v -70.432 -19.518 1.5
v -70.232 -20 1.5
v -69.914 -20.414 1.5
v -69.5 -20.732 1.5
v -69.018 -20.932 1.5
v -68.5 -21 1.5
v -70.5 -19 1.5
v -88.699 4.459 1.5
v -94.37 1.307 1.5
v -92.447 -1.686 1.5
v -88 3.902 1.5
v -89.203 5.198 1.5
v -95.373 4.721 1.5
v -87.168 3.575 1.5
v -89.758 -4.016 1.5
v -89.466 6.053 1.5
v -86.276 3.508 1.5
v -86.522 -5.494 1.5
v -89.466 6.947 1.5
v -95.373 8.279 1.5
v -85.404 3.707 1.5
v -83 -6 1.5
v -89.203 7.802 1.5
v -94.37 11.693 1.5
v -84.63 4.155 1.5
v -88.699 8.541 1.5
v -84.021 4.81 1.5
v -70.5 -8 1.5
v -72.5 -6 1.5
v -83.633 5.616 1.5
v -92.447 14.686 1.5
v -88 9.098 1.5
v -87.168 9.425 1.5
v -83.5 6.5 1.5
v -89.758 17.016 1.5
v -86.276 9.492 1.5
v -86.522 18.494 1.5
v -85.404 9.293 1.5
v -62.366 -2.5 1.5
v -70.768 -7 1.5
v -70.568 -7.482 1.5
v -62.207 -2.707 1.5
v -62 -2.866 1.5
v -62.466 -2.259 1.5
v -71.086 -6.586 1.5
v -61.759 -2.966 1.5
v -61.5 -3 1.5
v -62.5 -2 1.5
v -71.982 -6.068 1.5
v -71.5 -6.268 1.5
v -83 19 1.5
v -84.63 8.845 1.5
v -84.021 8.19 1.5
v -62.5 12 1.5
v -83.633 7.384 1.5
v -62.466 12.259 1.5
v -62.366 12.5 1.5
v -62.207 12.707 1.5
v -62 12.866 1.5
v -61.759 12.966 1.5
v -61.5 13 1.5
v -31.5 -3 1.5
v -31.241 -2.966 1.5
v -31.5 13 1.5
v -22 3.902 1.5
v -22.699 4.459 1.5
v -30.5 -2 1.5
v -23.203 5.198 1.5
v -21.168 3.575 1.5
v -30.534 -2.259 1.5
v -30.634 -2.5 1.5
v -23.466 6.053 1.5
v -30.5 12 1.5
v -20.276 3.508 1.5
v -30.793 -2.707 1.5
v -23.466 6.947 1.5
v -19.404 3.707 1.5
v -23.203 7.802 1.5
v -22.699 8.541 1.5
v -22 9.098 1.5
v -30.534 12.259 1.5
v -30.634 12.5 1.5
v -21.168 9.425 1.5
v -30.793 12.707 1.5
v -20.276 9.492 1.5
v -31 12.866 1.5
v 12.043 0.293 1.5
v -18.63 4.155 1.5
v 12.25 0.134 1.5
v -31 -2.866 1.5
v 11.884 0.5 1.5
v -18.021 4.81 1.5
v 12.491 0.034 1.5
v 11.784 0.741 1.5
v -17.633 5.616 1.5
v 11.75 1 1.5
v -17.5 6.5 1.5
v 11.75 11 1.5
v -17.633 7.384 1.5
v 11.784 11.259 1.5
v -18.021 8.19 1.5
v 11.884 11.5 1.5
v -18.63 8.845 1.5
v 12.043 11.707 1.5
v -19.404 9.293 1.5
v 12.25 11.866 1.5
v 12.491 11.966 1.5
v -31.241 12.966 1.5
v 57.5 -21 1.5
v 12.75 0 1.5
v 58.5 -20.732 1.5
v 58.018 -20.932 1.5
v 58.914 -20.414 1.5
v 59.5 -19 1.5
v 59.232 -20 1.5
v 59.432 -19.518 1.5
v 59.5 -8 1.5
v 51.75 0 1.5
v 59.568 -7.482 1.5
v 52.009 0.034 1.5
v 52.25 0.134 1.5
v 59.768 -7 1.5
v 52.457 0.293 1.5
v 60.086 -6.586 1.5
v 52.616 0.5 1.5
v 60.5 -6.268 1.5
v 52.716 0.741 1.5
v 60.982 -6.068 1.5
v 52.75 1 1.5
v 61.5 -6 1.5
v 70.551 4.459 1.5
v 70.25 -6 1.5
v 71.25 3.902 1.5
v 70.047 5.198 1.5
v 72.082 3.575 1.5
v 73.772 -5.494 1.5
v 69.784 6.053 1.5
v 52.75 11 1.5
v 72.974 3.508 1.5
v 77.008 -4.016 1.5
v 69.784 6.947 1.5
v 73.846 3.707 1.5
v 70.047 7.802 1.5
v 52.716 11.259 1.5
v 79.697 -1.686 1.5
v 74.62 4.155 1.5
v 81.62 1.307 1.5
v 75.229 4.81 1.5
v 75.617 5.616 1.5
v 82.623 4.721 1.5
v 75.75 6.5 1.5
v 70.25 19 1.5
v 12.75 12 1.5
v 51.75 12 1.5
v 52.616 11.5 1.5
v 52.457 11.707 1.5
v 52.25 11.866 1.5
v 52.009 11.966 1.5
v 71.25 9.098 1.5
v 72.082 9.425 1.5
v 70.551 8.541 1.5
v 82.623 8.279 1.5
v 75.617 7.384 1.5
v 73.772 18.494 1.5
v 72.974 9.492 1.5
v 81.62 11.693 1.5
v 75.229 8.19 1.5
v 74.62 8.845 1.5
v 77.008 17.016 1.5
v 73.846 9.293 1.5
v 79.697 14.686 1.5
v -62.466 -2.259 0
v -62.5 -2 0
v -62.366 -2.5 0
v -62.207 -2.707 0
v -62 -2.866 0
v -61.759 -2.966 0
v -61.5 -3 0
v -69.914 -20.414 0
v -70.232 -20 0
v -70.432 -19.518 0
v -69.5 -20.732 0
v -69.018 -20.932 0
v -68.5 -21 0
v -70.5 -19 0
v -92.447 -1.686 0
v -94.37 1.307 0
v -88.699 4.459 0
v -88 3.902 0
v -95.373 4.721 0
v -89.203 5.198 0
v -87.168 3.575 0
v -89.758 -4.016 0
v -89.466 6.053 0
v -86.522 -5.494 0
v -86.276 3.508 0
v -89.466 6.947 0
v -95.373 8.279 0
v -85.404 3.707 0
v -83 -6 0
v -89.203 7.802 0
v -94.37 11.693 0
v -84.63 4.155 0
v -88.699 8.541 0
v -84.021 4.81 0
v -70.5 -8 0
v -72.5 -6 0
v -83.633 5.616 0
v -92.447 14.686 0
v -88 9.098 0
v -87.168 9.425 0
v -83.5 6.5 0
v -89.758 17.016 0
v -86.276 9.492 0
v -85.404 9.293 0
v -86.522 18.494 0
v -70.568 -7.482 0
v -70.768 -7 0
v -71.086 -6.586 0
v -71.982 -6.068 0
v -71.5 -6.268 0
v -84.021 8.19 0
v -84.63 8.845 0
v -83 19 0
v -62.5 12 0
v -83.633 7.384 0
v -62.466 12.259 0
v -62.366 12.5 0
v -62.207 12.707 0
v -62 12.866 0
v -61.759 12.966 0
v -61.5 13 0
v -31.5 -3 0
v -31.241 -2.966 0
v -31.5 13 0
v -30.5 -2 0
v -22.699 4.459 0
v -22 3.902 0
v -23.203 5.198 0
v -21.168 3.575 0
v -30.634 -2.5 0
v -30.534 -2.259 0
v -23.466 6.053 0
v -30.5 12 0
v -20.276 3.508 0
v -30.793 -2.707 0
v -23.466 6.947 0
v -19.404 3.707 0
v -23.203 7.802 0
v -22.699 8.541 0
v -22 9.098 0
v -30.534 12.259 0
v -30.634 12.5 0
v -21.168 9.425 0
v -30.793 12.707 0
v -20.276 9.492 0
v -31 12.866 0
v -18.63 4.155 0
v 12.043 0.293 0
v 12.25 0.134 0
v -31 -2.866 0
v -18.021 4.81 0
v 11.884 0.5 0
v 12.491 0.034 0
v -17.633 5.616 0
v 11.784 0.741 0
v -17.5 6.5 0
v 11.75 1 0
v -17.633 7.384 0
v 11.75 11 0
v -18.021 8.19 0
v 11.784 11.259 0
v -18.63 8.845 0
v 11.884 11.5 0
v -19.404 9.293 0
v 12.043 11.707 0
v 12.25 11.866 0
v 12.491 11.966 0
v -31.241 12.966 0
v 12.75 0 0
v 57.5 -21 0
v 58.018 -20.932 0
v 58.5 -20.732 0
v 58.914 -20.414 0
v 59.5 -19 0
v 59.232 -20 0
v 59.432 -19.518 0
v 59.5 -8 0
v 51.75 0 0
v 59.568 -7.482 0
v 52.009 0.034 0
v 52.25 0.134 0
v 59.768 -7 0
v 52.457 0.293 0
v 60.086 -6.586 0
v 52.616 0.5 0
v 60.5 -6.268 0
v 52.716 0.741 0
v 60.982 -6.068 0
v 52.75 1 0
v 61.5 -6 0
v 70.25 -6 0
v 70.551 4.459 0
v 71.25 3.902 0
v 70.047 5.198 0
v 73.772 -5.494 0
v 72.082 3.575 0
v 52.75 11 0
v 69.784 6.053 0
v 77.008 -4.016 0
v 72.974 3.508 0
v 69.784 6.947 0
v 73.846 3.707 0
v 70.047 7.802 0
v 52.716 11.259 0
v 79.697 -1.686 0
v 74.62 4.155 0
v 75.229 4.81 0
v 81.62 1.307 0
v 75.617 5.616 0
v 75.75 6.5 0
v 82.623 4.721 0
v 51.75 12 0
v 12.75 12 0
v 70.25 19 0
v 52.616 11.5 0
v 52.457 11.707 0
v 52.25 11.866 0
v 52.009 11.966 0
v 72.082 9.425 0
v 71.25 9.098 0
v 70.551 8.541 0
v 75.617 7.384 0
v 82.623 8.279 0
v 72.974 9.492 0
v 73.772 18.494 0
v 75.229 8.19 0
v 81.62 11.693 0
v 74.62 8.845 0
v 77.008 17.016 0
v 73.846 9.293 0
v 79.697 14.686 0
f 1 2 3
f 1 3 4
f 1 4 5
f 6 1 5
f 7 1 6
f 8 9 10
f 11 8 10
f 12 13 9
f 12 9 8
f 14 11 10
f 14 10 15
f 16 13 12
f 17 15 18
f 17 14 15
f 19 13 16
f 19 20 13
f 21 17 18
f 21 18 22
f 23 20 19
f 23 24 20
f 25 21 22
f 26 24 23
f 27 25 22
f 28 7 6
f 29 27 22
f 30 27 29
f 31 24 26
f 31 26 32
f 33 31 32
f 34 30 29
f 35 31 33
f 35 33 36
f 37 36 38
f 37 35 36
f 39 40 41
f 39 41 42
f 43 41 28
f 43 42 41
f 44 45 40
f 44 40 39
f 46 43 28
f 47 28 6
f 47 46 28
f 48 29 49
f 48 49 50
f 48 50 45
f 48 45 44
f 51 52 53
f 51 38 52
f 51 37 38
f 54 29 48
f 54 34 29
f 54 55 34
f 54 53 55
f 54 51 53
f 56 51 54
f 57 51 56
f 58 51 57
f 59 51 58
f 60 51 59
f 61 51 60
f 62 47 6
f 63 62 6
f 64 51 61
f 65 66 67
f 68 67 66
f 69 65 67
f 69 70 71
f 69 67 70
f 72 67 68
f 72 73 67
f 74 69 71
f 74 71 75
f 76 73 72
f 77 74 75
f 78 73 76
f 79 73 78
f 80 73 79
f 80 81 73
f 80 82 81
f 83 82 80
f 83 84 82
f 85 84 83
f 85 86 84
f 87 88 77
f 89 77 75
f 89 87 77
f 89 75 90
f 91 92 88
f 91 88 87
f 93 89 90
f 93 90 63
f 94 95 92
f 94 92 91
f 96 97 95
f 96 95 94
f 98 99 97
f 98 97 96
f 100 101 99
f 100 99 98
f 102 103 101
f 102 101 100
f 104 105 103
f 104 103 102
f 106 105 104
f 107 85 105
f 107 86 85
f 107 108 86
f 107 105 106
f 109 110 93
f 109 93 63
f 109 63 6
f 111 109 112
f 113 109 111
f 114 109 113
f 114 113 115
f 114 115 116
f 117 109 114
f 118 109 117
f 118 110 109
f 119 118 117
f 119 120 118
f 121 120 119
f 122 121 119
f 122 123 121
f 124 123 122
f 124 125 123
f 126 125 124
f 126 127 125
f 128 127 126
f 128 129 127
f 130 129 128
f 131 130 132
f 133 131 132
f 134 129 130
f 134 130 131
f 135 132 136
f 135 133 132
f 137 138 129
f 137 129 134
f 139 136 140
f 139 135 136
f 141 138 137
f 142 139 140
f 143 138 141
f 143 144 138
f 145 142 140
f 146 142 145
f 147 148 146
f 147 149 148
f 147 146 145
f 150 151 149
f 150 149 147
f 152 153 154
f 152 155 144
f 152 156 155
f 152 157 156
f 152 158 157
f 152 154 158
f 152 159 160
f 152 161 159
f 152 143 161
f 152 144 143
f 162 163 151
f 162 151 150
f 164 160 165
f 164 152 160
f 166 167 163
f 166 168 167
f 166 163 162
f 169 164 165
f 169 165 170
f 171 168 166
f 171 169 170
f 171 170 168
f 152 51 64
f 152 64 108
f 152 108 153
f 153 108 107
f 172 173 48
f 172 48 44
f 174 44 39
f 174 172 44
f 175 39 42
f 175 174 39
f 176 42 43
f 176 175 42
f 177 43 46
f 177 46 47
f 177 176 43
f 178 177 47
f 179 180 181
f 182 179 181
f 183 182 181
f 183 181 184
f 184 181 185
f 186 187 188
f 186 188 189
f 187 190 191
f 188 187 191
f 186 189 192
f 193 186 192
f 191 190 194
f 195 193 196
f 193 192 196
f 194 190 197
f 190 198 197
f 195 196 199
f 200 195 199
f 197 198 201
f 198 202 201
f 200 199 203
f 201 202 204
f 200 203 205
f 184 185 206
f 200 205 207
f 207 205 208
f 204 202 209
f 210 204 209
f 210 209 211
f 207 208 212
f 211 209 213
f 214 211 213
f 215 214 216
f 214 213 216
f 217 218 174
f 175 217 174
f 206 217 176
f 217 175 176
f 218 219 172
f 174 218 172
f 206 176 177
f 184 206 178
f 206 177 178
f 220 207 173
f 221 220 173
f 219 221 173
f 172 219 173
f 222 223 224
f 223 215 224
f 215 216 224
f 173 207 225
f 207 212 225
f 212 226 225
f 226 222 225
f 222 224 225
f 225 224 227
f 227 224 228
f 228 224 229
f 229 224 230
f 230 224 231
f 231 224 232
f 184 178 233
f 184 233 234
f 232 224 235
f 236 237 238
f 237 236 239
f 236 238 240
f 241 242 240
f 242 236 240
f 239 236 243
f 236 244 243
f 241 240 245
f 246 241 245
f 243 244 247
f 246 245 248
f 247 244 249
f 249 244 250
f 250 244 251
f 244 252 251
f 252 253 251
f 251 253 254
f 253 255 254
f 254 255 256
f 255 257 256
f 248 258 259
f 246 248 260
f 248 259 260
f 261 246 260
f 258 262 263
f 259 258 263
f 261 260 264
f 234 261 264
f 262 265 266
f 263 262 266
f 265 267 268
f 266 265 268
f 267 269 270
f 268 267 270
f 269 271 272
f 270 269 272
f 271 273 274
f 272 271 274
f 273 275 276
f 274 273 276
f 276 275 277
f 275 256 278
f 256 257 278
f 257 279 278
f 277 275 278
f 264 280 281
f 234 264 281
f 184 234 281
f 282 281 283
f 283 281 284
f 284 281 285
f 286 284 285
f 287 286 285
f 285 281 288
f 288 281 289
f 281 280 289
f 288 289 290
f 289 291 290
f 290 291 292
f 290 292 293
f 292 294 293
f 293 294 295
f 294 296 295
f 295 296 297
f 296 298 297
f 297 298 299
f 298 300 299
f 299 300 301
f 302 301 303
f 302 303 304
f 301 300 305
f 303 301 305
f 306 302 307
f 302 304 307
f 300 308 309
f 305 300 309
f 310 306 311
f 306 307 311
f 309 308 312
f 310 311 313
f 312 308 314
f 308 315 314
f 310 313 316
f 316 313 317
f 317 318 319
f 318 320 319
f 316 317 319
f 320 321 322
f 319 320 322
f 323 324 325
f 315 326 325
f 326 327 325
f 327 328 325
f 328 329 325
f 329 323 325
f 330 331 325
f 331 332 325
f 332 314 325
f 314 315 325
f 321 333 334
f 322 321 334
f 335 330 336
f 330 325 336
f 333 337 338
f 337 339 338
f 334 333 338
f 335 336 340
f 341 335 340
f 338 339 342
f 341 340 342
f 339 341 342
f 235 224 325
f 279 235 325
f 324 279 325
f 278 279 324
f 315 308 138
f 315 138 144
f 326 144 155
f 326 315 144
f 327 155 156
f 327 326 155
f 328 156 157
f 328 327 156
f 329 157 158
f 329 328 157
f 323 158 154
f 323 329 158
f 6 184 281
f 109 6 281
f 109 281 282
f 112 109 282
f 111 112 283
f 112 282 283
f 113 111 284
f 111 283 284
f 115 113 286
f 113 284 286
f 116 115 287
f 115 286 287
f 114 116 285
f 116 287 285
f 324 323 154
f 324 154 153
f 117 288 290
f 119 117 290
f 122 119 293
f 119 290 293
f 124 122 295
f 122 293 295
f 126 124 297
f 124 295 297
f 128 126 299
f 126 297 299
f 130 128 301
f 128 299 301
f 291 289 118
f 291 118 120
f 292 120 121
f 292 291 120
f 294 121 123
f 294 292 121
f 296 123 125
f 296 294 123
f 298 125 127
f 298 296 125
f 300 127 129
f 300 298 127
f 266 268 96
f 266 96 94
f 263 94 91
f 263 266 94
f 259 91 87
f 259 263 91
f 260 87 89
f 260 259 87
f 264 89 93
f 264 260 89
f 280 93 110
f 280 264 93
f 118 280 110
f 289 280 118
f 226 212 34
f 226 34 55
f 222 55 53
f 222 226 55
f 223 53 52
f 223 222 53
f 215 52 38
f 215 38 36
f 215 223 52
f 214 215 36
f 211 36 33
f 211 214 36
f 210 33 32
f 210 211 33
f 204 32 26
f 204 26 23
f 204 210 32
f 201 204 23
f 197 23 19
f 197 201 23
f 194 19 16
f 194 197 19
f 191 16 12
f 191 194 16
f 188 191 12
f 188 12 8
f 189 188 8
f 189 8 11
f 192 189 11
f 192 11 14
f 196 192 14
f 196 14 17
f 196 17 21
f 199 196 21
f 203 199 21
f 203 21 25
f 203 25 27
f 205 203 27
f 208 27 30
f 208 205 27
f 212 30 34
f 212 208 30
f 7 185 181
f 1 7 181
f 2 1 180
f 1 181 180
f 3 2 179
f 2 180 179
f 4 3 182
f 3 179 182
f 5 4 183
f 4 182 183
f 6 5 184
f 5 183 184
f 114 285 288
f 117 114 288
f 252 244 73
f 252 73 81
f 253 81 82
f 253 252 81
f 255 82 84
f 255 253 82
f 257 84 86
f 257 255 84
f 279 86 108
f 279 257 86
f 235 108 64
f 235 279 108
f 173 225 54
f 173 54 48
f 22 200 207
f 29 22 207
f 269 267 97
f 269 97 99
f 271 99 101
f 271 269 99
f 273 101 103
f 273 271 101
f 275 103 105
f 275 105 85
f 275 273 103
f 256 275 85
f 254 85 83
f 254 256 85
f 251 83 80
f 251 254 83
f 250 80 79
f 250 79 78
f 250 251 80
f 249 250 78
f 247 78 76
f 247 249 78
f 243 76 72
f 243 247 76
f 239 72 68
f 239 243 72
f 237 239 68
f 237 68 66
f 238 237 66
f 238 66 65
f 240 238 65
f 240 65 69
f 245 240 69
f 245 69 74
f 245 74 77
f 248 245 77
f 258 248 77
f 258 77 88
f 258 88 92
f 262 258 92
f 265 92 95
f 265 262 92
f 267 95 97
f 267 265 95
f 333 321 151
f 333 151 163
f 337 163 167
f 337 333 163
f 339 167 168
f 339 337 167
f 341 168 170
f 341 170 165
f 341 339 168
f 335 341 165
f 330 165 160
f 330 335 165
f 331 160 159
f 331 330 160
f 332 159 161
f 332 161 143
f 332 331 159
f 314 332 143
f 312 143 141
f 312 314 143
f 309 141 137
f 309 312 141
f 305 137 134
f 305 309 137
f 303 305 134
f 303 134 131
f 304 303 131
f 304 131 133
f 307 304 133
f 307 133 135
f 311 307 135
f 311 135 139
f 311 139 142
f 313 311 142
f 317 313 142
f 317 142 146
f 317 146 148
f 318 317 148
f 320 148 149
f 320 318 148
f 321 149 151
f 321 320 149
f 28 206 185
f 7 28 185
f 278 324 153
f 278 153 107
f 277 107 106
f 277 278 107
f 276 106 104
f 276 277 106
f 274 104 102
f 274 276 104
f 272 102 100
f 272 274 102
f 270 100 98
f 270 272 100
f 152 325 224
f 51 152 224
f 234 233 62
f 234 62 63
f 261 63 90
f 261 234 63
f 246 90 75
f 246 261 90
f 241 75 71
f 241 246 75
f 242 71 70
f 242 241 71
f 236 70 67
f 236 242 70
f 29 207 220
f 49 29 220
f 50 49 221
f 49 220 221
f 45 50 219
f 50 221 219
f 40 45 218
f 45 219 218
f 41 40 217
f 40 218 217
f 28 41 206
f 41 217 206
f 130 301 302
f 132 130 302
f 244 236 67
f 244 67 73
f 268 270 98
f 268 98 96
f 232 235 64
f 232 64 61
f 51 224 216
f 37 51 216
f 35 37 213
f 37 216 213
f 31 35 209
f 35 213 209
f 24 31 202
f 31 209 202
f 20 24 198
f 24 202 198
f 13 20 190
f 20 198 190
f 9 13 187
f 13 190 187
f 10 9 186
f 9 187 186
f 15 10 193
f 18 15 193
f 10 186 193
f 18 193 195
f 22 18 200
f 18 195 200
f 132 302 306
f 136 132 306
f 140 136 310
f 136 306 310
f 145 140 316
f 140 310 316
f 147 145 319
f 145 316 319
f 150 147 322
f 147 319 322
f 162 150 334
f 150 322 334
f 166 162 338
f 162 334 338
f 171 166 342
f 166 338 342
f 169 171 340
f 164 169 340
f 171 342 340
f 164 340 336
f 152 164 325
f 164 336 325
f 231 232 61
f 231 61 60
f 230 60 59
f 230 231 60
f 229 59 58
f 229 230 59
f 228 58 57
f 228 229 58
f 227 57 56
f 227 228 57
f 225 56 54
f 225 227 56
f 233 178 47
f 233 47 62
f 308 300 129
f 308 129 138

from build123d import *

# Parameters (mm, degrees)
ESQUISSE1_R      = 3
EXTRUSION1_DEPTH = 1.5


with BuildPart() as part:
    # Esquisse1 → Extrusion1 (new body)
    with BuildSketch(Plane.XY):
        with BuildLine():
            Line((-83, -6), (-72.5, -6))
            ThreePointArc((-72.5, -6), (-71.085786438, -6.585786438), (-70.5, -8))
            Line((-70.5, -8), (-70.5, -19))
            ThreePointArc((-70.5, -19), (-69.914213562, -20.414213562), (-68.5, -21))
            Line((-68.5, -21), (57.5, -21))
            ThreePointArc((57.5, -21), (58.914213562, -20.414213562), (59.5, -19))
            Line((59.5, -19), (59.5, -8))
            ThreePointArc((59.5, -8), (60.085786438, -6.585786438), (61.5, -6))
            Line((61.5, -6), (70.25, -6))
            ThreePointArc((70.25, -6), (82.75, 6.5), (70.25, 19))
            Line((70.25, 19), (-83, 19))
            ThreePointArc((-83, 19), (-95.5, 6.5), (-83, -6))
        make_face()
        with Locations((-86.5, 6.5)):
            Circle(ESQUISSE1_R, mode=Mode.SUBTRACT)
        with Locations((-20.5, 6.5)):
            Circle(ESQUISSE1_R, mode=Mode.SUBTRACT)
        with Locations((72.75, 6.5)):
            Circle(ESQUISSE1_R, mode=Mode.SUBTRACT)
        with BuildLine():
            Line((-31.5, 13), (-61.5, 13))
            ThreePointArc((-61.5, 13), (-62.207106781, 12.707106781), (-62.5, 12))
            Line((-62.5, 12), (-62.5, -2))
            ThreePointArc((-62.5, -2), (-62.207106781, -2.707106781), (-61.5, -3))
            Line((-61.5, -3), (-31.5, -3))
            ThreePointArc((-31.5, -3), (-30.792893219, -2.707106781), (-30.5, -2))
            Line((-30.5, -2), (-30.5, 12))
            ThreePointArc((-30.5, 12), (-30.792893219, 12.707106781), (-31.5, 13))
        make_face(mode=Mode.SUBTRACT)
        with BuildLine():
            Line((51.75, 12), (12.75, 12))
            ThreePointArc((12.75, 12), (12.042893219, 11.707106781), (11.75, 11))
            Line((11.75, 11), (11.75, 1))
            ThreePointArc((11.75, 1), (12.042893219, 0.292893219), (12.75, 0))
            Line((12.75, 0), (51.75, 0))
            ThreePointArc((51.75, 0), (52.457106781, 0.292893219), (52.75, 1))
            Line((52.75, 1), (52.75, 11))
            ThreePointArc((52.75, 11), (52.457106781, 11.707106781), (51.75, 12))
        make_face(mode=Mode.SUBTRACT)
    extrude(amount=EXTRUSION1_DEPTH)


solid = part.part
